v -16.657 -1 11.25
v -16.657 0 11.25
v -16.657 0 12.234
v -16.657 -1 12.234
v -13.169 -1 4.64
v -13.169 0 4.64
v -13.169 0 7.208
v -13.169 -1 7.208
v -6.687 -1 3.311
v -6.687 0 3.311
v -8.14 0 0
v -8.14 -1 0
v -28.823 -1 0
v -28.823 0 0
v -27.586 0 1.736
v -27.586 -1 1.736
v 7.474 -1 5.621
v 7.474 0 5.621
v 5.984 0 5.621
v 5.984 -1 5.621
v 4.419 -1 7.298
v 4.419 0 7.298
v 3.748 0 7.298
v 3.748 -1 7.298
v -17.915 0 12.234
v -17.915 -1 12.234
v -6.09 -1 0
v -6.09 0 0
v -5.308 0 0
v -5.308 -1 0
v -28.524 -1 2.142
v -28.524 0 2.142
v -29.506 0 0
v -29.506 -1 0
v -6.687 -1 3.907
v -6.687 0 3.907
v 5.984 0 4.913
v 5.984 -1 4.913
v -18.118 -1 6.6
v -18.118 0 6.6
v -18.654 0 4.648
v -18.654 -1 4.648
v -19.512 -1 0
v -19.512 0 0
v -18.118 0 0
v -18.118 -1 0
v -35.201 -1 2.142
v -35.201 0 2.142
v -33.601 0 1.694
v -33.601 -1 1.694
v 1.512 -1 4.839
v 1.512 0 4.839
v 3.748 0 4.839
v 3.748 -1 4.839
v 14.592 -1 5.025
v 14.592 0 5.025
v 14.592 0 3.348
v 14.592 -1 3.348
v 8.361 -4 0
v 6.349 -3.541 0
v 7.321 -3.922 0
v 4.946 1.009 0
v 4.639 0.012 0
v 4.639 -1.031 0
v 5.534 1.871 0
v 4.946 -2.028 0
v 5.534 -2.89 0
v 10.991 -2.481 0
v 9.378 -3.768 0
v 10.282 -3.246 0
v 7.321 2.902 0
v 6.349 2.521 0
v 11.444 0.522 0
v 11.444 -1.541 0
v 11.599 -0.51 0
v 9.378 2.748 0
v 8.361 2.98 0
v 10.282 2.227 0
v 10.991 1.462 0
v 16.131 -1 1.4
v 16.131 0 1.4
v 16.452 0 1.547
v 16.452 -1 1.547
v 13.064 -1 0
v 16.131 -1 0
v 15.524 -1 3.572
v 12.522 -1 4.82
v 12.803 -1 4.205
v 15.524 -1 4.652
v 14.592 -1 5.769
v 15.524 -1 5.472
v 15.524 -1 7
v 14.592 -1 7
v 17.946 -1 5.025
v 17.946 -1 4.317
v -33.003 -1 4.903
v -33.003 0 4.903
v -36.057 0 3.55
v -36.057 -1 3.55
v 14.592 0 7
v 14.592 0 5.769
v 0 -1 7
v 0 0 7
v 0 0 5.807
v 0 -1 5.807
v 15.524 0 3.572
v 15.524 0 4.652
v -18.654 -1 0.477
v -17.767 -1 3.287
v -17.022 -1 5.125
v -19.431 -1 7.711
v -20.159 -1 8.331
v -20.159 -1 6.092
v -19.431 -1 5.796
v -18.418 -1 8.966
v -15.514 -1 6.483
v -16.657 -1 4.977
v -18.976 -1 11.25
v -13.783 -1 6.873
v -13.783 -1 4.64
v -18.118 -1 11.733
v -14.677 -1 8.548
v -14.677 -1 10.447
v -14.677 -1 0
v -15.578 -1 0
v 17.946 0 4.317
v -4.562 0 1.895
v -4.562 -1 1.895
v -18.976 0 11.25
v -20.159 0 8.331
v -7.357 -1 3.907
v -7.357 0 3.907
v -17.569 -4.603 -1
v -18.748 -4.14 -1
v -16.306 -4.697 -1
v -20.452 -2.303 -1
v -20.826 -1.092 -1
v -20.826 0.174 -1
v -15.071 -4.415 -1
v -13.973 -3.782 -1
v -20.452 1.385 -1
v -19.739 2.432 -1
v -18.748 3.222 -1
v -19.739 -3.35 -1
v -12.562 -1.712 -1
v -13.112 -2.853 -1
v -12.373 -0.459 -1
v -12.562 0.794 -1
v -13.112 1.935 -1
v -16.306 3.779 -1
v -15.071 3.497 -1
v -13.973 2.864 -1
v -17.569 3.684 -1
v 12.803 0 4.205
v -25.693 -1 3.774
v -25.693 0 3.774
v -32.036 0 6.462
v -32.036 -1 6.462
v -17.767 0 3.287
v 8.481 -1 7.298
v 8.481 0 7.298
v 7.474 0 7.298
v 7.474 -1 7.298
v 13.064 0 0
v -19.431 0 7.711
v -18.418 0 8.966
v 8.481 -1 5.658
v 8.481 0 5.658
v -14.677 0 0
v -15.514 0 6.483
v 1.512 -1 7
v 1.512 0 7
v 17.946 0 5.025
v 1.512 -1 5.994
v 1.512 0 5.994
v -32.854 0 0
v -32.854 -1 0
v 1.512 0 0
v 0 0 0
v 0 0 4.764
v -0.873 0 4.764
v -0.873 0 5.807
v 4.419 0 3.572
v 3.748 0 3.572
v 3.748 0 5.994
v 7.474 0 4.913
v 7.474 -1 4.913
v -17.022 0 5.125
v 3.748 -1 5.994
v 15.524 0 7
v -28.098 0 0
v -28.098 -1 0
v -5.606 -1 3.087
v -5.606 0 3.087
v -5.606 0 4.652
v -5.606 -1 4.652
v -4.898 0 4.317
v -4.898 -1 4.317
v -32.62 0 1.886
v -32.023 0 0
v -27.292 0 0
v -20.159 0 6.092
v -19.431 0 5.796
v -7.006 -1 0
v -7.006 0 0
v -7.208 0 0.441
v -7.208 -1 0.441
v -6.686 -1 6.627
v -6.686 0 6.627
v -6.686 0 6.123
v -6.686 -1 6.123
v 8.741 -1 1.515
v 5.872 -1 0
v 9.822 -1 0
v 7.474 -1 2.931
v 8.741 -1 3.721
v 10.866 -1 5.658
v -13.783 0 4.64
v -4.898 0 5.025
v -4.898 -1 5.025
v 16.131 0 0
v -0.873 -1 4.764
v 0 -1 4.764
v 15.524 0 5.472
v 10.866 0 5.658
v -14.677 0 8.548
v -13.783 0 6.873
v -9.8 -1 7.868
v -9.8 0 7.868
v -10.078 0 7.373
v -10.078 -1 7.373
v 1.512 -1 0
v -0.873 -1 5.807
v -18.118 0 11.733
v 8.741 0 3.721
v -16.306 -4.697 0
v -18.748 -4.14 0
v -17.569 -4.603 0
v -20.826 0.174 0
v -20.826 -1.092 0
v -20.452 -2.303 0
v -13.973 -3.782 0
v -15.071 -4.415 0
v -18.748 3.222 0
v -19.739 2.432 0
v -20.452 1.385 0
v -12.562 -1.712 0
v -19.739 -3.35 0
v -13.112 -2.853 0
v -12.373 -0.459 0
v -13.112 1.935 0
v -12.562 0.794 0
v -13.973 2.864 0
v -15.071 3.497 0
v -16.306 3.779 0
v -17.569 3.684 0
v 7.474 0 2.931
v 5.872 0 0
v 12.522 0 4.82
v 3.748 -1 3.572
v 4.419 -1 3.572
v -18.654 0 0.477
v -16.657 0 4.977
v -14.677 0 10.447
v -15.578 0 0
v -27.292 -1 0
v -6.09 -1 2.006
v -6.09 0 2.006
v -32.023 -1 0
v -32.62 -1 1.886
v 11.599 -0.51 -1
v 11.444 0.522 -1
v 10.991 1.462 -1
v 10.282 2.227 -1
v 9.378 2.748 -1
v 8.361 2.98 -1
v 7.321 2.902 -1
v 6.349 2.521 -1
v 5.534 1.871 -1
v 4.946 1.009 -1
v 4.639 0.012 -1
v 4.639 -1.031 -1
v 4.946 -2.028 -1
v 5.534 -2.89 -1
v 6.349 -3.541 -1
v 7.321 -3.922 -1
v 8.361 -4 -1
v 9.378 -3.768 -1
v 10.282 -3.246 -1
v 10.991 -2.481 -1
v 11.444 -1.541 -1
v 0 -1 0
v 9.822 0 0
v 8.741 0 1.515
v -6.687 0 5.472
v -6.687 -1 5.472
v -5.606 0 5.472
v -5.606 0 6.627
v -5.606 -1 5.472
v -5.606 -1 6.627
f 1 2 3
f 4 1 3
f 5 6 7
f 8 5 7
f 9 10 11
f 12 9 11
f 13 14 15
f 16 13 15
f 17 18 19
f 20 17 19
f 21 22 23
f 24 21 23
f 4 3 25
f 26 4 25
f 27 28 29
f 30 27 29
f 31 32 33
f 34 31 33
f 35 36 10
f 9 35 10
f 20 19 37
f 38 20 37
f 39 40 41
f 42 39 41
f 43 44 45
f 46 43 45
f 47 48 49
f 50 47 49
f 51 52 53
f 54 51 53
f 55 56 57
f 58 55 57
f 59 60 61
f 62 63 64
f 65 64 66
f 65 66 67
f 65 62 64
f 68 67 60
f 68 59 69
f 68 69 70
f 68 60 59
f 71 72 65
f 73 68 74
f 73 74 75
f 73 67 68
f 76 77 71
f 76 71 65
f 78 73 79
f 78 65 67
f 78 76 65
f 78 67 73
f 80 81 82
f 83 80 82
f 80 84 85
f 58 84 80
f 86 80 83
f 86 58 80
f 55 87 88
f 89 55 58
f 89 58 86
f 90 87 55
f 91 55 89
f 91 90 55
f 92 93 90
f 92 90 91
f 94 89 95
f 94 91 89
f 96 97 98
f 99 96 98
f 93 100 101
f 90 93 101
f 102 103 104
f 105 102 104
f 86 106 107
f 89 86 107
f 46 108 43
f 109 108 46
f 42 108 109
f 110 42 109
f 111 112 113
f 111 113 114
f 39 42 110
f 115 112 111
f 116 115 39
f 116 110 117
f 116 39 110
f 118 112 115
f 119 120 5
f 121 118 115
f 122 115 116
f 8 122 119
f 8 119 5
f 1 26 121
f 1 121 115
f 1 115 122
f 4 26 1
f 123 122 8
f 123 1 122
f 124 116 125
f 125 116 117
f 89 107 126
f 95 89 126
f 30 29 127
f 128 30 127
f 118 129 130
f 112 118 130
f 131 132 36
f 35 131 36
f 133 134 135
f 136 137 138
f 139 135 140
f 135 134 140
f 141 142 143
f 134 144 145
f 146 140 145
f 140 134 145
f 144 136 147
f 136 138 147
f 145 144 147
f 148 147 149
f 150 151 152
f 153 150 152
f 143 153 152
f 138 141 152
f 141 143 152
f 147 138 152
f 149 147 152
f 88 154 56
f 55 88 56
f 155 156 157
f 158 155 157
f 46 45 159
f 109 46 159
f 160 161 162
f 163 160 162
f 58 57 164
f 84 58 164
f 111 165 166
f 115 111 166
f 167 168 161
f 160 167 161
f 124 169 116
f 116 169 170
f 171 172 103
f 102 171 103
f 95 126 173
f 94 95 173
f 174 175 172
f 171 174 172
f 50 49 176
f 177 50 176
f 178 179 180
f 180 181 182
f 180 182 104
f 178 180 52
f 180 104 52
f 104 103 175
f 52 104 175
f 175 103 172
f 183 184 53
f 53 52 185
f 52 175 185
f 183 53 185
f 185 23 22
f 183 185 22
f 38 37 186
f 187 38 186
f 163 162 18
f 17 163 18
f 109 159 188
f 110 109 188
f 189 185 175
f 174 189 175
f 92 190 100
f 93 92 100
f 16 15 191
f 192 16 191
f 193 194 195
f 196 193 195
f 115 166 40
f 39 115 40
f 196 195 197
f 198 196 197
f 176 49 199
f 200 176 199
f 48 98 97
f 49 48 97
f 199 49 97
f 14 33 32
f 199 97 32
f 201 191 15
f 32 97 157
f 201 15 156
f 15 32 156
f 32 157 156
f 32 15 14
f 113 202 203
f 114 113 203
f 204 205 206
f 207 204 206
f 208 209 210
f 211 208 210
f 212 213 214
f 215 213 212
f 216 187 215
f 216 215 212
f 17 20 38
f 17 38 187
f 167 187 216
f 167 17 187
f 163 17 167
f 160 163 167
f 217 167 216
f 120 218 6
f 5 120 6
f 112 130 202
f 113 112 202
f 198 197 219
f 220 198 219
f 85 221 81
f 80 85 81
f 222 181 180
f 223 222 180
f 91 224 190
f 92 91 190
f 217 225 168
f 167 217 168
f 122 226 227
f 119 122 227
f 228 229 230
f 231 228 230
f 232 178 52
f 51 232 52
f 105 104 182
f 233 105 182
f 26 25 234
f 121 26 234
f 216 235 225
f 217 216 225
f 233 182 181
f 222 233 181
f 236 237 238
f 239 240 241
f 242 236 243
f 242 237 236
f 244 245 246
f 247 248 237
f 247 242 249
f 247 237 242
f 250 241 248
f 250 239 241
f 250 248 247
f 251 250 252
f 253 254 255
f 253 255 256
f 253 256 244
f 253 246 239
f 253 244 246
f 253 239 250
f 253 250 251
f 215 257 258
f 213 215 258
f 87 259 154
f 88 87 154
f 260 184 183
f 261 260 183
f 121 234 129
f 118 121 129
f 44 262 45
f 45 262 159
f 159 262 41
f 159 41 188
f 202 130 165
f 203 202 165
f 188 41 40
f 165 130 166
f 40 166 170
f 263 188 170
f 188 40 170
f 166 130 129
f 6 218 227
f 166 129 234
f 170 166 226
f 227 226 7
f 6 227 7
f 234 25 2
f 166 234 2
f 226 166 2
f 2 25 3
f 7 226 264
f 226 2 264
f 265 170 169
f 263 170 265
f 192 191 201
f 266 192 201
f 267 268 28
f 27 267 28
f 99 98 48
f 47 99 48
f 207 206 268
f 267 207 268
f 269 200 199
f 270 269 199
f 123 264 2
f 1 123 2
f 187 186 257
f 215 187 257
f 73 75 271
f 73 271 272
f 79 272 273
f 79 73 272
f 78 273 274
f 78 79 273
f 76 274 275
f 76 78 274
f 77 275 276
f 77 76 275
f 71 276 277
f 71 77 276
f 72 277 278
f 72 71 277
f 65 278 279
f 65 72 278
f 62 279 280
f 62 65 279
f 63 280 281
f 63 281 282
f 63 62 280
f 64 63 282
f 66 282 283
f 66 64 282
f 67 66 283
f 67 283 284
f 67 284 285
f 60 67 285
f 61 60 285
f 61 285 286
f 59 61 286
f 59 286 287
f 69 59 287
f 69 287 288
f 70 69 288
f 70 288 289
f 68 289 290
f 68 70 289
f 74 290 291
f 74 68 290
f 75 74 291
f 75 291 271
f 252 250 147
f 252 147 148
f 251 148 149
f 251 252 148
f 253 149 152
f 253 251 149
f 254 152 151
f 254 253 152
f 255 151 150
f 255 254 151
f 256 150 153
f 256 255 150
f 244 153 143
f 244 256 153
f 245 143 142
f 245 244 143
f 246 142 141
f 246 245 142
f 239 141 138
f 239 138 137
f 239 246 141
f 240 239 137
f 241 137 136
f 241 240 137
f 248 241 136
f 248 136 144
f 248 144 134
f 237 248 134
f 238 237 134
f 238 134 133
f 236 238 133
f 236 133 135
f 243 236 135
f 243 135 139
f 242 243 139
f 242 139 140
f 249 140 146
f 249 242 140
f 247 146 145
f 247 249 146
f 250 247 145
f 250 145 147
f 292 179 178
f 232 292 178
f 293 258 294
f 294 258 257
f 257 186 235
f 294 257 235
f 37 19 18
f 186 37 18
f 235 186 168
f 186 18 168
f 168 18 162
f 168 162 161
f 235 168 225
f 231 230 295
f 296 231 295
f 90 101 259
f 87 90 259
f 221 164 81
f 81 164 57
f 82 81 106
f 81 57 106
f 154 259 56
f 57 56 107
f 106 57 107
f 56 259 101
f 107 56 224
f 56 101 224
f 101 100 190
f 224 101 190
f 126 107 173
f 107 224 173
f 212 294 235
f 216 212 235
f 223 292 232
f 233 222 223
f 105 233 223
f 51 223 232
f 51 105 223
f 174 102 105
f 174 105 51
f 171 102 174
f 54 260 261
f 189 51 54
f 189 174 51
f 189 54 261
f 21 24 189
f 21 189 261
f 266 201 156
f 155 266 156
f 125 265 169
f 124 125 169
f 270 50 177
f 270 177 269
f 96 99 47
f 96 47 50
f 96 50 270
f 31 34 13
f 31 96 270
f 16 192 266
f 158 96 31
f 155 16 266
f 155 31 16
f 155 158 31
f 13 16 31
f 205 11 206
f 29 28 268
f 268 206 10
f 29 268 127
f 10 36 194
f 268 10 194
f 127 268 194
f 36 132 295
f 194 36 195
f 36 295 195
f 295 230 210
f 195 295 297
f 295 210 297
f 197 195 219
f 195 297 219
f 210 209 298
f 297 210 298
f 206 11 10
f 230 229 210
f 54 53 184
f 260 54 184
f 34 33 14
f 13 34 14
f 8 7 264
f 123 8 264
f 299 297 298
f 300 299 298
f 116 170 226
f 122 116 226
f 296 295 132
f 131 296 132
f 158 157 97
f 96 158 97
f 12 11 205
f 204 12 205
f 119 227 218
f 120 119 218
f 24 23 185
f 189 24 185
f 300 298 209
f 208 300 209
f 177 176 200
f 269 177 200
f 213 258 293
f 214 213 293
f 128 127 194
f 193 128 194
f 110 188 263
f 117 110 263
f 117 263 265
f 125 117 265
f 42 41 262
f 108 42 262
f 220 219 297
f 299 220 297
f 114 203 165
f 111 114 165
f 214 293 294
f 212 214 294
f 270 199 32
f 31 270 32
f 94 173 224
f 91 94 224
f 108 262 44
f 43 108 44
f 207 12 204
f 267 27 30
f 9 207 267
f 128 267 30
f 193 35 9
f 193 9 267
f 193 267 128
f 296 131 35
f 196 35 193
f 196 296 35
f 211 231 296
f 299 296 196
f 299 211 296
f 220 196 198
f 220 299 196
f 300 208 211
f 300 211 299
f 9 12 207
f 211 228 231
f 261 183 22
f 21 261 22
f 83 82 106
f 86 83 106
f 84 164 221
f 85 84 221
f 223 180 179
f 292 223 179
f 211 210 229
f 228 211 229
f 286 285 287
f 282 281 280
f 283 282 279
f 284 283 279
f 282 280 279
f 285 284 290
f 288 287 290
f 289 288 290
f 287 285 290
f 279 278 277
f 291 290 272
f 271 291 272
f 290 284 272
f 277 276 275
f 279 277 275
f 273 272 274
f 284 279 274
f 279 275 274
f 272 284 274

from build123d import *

# Parameters (mm, degrees)
F1_DEPTH = 1
F2_R     = 3.5
F3_DEPTH = 1
F2_R_2   = 4.25
F4_DEPTH = 1


with BuildPart() as f1:
    # F0 (on Front) → F1 (new body)
    with BuildSketch(Plane.XZ):
        Polygon((0, 2.931375), (0, 0), (1.511916, 0), (1.511916, 4.83858), (3.747868, 4.83858), (3.747868, 3.571541), (4.418654, 3.571541), (4.418654, 7.298127), (3.747868, 7.298127), (3.747868, 5.993822), (1.511916, 5.993822), (1.511916, 7), (0, 7), (0, 5.807493), (-0.873099, 5.807493), (-0.873099, 4.764048), (0, 4.764048), align=None)
        Polygon((7.474455, 2.931375), (5.872022, 0), (9.822204, 0), (8.741493, 1.514575), (8.741493, 3.720604), (10.865648, 5.658429), (8.480632, 5.658429), (8.480632, 7.298127), (7.474455, 7.298127), (7.474455, 5.621163), (5.98382, 5.621163), (5.98382, 4.913112), (7.474455, 4.913112), align=None)
        Polygon((14.592235, 3.347945), (13.064334, 0), (16.131149, 0), (16.131149, 1.399641), (16.451944, 1.546672), (15.52388, 3.57154), (15.52388, 4.65225), (17.946162, 4.316857), (17.946162, 5.024909), (15.52388, 5.472099), (15.52388, 7), (14.592235, 7), (14.592235, 5.768673), (12.52176, 4.819706), (12.803473, 4.20506), (14.592235, 5.024909), align=None)
        Polygon((-6.686575, 3.310679), (-8.139944, 0), (-7.006077, 0), (-7.208297, 0.441207), (-6.090321, 2.006374), (-6.090321, 0), (-5.307738, 0), (-4.562421, 1.894576), (-5.605865, 3.087084), (-5.605865, 4.65225), (-4.897814, 4.316857), (-4.897814, 5.024909), (-5.605865, 5.472099), (-5.605865, 6.123173), (-5.605865, 6.627341), (-6.685746, 6.627341), (-6.685746, 6.123173), (-9.799898, 7.868467), (-10.077769, 7.372658), (-6.686575, 5.472099), (-7.357361, 3.906933), (-6.686575, 3.906933), align=None)
        Polygon((-15.578222, 0), (-14.67671, 0), (-15.514247, 6.482509), (-14.67671, 8.54843), (-13.78334, 6.873359), (-13.78334, 4.639931), (-13.169146, 4.639931), (-13.169146, 7.208374), (-14.67671, 10.446845), (-16.657091, 11.249703), (-16.657091, 12.233587), (-17.915183, 12.233587), (-18.117999, 11.733308), (-18.97606, 11.249703), (-20.159341, 8.330947), (-20.159341, 6.091659), (-19.430811, 5.796309), (-19.430811, 7.710895), (-18.417704, 8.966146), (-18.117999, 6.599911), (-18.654327, 4.647767), (-18.654327, 0.477278), (-19.512087, 0), (-18.117999, 0), (-17.766989, 3.287182), (-17.021881, 5.125114), (-16.657091, 4.977226), align=None)
        Polygon((-32.035787, 6.461732), (-33.003295, 4.902968), (-36.057357, 3.550369), (-35.200886, 2.141602), (-33.601068, 1.693653), (-32.85449, 0), (-32.022584, 0), (-32.619849, 1.885631), (-28.524317, 2.141602), (-29.505538, 0), (-28.822949, 0), (-27.585758, 1.736315), (-28.097698, 0), (-27.292471, 0), (-25.69323, 3.774208), align=None)
    extrude(amount=F1_DEPTH)


with BuildPart() as f3:
    # F2 (on Top) → F3 (new body)
    with BuildSketch(Plane.XY):
        with Locations((8.099429, -0.509851)):
            Circle(F2_R)
    extrude(amount=-F3_DEPTH)


with BuildPart() as f4:
    # F2 (on Top) → F4 (new body)
    with BuildSketch(Plane.XY):
        with Locations((-16.623287, -0.45907)):
            Circle(F2_R_2)
    extrude(amount=-F4_DEPTH)


solid = Compound([f1.part, f3.part, f4.part])
